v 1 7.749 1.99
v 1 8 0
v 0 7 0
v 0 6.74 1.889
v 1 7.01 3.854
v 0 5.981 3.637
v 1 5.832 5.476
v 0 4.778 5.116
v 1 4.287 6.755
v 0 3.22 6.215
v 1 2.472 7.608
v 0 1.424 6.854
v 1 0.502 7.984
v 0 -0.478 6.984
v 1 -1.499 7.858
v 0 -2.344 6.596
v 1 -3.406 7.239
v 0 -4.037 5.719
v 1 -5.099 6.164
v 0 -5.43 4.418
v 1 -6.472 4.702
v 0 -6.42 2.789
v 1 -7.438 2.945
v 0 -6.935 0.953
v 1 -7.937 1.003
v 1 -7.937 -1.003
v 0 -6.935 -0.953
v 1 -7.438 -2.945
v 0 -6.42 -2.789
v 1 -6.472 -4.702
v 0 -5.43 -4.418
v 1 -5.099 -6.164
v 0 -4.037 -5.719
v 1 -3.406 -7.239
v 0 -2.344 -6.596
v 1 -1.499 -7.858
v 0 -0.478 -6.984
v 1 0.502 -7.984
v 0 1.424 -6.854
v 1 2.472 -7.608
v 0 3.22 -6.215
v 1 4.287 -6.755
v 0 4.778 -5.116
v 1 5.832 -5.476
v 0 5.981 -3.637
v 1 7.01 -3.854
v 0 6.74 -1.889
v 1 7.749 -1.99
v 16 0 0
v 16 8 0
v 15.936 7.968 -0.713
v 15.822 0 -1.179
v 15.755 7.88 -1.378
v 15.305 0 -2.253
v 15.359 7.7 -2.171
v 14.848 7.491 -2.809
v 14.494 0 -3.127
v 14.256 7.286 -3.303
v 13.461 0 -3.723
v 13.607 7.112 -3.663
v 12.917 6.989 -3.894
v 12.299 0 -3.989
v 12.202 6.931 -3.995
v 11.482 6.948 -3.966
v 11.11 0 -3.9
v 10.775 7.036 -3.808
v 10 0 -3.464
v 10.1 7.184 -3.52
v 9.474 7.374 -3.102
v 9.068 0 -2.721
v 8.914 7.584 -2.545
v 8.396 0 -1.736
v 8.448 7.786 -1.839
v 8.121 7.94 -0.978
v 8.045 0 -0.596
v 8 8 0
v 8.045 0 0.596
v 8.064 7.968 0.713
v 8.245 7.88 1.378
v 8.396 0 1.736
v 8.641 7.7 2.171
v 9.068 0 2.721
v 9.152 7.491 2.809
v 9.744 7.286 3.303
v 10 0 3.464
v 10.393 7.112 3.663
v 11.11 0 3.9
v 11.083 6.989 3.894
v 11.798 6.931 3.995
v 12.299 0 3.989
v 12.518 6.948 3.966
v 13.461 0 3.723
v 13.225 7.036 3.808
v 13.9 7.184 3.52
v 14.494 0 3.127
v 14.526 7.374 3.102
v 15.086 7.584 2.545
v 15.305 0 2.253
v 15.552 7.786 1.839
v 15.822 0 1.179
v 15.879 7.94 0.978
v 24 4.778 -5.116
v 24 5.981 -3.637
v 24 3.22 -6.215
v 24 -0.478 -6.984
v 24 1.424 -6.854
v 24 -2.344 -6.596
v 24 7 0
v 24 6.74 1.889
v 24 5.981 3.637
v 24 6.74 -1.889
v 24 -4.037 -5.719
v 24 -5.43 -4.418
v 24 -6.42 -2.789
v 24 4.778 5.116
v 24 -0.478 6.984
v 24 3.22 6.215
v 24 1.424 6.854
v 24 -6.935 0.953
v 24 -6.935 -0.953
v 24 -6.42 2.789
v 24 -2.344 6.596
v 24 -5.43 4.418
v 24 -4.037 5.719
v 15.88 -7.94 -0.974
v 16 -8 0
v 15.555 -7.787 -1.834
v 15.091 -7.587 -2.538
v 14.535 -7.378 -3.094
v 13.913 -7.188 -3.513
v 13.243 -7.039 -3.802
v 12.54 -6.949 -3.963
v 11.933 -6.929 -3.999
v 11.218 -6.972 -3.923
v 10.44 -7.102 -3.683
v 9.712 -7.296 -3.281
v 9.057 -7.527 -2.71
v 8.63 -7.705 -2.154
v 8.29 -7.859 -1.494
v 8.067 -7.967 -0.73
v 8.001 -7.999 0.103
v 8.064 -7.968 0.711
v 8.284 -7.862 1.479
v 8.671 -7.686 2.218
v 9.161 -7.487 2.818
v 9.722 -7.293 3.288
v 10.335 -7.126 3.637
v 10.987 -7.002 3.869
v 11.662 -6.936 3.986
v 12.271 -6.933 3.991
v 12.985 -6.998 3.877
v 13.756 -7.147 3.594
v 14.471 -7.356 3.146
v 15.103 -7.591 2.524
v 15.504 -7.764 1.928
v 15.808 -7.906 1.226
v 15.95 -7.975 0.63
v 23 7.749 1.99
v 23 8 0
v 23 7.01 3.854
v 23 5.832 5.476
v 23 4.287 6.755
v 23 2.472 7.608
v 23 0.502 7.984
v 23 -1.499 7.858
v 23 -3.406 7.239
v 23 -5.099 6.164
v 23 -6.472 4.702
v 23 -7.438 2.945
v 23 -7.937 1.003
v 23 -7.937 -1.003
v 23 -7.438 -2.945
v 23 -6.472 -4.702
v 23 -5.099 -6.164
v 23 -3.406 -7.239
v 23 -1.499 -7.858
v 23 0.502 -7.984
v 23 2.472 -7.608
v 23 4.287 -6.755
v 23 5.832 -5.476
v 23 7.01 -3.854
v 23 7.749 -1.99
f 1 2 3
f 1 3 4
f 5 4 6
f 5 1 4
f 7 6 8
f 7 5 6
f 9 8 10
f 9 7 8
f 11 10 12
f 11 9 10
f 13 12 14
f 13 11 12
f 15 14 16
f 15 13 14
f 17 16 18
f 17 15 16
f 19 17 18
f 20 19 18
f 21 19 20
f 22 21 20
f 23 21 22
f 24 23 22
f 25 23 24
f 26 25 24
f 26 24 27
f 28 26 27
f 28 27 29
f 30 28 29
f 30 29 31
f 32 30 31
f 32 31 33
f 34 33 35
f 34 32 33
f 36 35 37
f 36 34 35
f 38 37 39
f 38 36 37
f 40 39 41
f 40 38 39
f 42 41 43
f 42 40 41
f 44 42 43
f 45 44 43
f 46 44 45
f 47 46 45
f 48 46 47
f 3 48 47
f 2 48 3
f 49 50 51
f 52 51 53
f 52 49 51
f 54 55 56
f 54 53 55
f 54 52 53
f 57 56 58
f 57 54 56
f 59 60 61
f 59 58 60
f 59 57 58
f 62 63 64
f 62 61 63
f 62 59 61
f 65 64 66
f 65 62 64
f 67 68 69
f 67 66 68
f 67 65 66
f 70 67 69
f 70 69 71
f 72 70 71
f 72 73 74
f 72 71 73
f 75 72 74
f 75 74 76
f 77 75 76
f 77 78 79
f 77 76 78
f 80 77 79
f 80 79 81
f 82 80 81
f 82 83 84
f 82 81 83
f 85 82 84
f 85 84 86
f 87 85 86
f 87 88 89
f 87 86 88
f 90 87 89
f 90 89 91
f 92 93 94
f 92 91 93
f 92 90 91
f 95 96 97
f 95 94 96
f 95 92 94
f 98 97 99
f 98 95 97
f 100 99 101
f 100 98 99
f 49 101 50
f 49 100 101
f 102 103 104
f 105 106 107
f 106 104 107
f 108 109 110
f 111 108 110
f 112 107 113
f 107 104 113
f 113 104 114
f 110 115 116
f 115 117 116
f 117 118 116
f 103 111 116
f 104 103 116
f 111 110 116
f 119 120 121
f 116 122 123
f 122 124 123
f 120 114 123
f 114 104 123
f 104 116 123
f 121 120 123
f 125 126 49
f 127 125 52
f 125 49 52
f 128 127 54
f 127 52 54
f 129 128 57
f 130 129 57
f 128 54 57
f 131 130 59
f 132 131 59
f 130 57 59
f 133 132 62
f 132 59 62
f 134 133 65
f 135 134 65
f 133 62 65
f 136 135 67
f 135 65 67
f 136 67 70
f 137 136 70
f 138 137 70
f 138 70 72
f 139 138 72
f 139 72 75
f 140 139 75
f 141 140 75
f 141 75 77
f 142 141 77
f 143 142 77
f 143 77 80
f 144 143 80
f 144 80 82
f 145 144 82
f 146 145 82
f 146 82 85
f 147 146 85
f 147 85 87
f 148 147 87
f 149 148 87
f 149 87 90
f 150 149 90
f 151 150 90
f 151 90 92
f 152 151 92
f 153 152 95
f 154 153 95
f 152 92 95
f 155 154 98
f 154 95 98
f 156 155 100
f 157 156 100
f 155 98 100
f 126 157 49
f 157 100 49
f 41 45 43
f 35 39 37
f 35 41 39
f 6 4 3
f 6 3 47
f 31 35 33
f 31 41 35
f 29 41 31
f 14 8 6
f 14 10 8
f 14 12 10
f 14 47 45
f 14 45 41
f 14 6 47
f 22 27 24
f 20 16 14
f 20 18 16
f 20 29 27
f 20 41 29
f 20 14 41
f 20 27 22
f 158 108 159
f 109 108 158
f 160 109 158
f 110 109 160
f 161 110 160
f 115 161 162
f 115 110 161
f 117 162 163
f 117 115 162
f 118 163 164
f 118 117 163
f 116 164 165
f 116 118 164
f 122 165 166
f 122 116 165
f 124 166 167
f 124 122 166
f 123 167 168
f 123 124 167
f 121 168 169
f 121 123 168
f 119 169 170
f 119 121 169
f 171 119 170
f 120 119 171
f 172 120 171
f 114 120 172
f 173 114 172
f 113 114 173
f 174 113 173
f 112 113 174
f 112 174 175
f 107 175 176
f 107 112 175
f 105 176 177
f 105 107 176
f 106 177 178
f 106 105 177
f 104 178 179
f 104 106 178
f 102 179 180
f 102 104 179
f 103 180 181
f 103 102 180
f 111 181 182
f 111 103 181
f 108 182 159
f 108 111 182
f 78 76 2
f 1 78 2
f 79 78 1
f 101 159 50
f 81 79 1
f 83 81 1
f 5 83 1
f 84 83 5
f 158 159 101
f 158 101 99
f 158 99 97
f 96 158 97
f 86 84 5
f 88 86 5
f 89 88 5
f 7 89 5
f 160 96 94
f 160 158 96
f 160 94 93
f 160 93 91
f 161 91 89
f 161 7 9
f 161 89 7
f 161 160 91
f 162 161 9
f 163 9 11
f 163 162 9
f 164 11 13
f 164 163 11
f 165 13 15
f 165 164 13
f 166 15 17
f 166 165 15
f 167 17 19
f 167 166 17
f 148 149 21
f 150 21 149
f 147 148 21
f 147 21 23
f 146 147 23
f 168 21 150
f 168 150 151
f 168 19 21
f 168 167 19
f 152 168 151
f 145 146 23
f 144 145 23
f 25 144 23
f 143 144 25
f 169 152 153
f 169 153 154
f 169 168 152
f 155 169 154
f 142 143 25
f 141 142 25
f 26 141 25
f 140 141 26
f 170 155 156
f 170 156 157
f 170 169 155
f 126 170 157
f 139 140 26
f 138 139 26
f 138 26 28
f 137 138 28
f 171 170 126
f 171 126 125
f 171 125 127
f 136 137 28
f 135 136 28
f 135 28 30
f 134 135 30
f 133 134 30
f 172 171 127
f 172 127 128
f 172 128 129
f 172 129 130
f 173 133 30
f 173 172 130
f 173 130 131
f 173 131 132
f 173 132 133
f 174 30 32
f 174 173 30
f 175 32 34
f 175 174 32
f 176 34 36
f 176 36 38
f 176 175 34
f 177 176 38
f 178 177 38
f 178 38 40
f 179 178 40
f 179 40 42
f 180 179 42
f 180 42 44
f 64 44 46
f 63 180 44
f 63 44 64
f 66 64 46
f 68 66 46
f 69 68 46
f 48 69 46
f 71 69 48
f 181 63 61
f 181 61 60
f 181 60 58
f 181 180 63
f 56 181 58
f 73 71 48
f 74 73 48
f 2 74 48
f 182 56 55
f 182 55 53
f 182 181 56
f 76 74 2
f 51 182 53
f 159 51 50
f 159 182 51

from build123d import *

# Parameters (mm, degrees)
SZKIC1_W                               = 24
SZKIC1_H                               = 8
WYTNIJ_WYCI_GNI_CIE1_REACH             = 10
SZKIC2_R                               = 4
WYTNIJ_WYCI_GNI_CIE1_DIRECTION_2_REACH = 10
SFAZOWANIE1_SIZE                       = 1


with BuildPart() as part:
    # Szkic1 → Obrót1 (revolve)
    with BuildSketch(Plane.XY):
        with Locations((12, 4)):
            Rectangle(SZKIC1_W, SZKIC1_H)
    revolve(axis=Axis((0, 0, 0), (1, 0, 0)))

    # Szkic2 → Wytnij-wyciągnięcie1 (cut, up to next)
    with BuildSketch(Plane(origin=(0, 0, 0), x_dir=(1, 0, 0), z_dir=(0, 1, 0)), mode=Mode.PRIVATE) as wytnij_wyci_gni_cie1_sk1:
        with Locations((12, 0)):
            Circle(SZKIC2_R)
    wytnij_wyci_gni_cie1_tool1 = extrude(wytnij_wyci_gni_cie1_sk1.sketch, amount=-WYTNIJ_WYCI_GNI_CIE1_REACH, mode=Mode.PRIVATE) & part.part
    add(wytnij_wyci_gni_cie1_tool1.solids().sort_by_distance((12, 0, 0))[0], mode=Mode.SUBTRACT)

    # Szkic2 → Wytnij-wyciągnięcie1 direction 2 (cut, up to next)
    with BuildSketch(Plane(origin=(0, 0, 0), x_dir=(1, 0, 0), z_dir=(0, 1, 0)), mode=Mode.PRIVATE) as wytnij_wyci_gni_cie1_direction_2_sk1:
        with Locations((12, 0)):
            Circle(SZKIC2_R)
    wytnij_wyci_gni_cie1_direction_2_tool1 = extrude(wytnij_wyci_gni_cie1_direction_2_sk1.sketch, amount=WYTNIJ_WYCI_GNI_CIE1_DIRECTION_2_REACH, mode=Mode.PRIVATE) & part.part
    add(wytnij_wyci_gni_cie1_direction_2_tool1.solids().sort_by_distance((12, 0, 0))[0], mode=Mode.SUBTRACT)

    # Sfazowanie1
    sfazowanie1_edges = [part.edges().sort_by_distance(p)[0] for p in [
        (0, -8, 0),
        (24, -8, 0),
    ]]
    chamfer(sfazowanie1_edges, length=SFAZOWANIE1_SIZE)


solid = part.part
